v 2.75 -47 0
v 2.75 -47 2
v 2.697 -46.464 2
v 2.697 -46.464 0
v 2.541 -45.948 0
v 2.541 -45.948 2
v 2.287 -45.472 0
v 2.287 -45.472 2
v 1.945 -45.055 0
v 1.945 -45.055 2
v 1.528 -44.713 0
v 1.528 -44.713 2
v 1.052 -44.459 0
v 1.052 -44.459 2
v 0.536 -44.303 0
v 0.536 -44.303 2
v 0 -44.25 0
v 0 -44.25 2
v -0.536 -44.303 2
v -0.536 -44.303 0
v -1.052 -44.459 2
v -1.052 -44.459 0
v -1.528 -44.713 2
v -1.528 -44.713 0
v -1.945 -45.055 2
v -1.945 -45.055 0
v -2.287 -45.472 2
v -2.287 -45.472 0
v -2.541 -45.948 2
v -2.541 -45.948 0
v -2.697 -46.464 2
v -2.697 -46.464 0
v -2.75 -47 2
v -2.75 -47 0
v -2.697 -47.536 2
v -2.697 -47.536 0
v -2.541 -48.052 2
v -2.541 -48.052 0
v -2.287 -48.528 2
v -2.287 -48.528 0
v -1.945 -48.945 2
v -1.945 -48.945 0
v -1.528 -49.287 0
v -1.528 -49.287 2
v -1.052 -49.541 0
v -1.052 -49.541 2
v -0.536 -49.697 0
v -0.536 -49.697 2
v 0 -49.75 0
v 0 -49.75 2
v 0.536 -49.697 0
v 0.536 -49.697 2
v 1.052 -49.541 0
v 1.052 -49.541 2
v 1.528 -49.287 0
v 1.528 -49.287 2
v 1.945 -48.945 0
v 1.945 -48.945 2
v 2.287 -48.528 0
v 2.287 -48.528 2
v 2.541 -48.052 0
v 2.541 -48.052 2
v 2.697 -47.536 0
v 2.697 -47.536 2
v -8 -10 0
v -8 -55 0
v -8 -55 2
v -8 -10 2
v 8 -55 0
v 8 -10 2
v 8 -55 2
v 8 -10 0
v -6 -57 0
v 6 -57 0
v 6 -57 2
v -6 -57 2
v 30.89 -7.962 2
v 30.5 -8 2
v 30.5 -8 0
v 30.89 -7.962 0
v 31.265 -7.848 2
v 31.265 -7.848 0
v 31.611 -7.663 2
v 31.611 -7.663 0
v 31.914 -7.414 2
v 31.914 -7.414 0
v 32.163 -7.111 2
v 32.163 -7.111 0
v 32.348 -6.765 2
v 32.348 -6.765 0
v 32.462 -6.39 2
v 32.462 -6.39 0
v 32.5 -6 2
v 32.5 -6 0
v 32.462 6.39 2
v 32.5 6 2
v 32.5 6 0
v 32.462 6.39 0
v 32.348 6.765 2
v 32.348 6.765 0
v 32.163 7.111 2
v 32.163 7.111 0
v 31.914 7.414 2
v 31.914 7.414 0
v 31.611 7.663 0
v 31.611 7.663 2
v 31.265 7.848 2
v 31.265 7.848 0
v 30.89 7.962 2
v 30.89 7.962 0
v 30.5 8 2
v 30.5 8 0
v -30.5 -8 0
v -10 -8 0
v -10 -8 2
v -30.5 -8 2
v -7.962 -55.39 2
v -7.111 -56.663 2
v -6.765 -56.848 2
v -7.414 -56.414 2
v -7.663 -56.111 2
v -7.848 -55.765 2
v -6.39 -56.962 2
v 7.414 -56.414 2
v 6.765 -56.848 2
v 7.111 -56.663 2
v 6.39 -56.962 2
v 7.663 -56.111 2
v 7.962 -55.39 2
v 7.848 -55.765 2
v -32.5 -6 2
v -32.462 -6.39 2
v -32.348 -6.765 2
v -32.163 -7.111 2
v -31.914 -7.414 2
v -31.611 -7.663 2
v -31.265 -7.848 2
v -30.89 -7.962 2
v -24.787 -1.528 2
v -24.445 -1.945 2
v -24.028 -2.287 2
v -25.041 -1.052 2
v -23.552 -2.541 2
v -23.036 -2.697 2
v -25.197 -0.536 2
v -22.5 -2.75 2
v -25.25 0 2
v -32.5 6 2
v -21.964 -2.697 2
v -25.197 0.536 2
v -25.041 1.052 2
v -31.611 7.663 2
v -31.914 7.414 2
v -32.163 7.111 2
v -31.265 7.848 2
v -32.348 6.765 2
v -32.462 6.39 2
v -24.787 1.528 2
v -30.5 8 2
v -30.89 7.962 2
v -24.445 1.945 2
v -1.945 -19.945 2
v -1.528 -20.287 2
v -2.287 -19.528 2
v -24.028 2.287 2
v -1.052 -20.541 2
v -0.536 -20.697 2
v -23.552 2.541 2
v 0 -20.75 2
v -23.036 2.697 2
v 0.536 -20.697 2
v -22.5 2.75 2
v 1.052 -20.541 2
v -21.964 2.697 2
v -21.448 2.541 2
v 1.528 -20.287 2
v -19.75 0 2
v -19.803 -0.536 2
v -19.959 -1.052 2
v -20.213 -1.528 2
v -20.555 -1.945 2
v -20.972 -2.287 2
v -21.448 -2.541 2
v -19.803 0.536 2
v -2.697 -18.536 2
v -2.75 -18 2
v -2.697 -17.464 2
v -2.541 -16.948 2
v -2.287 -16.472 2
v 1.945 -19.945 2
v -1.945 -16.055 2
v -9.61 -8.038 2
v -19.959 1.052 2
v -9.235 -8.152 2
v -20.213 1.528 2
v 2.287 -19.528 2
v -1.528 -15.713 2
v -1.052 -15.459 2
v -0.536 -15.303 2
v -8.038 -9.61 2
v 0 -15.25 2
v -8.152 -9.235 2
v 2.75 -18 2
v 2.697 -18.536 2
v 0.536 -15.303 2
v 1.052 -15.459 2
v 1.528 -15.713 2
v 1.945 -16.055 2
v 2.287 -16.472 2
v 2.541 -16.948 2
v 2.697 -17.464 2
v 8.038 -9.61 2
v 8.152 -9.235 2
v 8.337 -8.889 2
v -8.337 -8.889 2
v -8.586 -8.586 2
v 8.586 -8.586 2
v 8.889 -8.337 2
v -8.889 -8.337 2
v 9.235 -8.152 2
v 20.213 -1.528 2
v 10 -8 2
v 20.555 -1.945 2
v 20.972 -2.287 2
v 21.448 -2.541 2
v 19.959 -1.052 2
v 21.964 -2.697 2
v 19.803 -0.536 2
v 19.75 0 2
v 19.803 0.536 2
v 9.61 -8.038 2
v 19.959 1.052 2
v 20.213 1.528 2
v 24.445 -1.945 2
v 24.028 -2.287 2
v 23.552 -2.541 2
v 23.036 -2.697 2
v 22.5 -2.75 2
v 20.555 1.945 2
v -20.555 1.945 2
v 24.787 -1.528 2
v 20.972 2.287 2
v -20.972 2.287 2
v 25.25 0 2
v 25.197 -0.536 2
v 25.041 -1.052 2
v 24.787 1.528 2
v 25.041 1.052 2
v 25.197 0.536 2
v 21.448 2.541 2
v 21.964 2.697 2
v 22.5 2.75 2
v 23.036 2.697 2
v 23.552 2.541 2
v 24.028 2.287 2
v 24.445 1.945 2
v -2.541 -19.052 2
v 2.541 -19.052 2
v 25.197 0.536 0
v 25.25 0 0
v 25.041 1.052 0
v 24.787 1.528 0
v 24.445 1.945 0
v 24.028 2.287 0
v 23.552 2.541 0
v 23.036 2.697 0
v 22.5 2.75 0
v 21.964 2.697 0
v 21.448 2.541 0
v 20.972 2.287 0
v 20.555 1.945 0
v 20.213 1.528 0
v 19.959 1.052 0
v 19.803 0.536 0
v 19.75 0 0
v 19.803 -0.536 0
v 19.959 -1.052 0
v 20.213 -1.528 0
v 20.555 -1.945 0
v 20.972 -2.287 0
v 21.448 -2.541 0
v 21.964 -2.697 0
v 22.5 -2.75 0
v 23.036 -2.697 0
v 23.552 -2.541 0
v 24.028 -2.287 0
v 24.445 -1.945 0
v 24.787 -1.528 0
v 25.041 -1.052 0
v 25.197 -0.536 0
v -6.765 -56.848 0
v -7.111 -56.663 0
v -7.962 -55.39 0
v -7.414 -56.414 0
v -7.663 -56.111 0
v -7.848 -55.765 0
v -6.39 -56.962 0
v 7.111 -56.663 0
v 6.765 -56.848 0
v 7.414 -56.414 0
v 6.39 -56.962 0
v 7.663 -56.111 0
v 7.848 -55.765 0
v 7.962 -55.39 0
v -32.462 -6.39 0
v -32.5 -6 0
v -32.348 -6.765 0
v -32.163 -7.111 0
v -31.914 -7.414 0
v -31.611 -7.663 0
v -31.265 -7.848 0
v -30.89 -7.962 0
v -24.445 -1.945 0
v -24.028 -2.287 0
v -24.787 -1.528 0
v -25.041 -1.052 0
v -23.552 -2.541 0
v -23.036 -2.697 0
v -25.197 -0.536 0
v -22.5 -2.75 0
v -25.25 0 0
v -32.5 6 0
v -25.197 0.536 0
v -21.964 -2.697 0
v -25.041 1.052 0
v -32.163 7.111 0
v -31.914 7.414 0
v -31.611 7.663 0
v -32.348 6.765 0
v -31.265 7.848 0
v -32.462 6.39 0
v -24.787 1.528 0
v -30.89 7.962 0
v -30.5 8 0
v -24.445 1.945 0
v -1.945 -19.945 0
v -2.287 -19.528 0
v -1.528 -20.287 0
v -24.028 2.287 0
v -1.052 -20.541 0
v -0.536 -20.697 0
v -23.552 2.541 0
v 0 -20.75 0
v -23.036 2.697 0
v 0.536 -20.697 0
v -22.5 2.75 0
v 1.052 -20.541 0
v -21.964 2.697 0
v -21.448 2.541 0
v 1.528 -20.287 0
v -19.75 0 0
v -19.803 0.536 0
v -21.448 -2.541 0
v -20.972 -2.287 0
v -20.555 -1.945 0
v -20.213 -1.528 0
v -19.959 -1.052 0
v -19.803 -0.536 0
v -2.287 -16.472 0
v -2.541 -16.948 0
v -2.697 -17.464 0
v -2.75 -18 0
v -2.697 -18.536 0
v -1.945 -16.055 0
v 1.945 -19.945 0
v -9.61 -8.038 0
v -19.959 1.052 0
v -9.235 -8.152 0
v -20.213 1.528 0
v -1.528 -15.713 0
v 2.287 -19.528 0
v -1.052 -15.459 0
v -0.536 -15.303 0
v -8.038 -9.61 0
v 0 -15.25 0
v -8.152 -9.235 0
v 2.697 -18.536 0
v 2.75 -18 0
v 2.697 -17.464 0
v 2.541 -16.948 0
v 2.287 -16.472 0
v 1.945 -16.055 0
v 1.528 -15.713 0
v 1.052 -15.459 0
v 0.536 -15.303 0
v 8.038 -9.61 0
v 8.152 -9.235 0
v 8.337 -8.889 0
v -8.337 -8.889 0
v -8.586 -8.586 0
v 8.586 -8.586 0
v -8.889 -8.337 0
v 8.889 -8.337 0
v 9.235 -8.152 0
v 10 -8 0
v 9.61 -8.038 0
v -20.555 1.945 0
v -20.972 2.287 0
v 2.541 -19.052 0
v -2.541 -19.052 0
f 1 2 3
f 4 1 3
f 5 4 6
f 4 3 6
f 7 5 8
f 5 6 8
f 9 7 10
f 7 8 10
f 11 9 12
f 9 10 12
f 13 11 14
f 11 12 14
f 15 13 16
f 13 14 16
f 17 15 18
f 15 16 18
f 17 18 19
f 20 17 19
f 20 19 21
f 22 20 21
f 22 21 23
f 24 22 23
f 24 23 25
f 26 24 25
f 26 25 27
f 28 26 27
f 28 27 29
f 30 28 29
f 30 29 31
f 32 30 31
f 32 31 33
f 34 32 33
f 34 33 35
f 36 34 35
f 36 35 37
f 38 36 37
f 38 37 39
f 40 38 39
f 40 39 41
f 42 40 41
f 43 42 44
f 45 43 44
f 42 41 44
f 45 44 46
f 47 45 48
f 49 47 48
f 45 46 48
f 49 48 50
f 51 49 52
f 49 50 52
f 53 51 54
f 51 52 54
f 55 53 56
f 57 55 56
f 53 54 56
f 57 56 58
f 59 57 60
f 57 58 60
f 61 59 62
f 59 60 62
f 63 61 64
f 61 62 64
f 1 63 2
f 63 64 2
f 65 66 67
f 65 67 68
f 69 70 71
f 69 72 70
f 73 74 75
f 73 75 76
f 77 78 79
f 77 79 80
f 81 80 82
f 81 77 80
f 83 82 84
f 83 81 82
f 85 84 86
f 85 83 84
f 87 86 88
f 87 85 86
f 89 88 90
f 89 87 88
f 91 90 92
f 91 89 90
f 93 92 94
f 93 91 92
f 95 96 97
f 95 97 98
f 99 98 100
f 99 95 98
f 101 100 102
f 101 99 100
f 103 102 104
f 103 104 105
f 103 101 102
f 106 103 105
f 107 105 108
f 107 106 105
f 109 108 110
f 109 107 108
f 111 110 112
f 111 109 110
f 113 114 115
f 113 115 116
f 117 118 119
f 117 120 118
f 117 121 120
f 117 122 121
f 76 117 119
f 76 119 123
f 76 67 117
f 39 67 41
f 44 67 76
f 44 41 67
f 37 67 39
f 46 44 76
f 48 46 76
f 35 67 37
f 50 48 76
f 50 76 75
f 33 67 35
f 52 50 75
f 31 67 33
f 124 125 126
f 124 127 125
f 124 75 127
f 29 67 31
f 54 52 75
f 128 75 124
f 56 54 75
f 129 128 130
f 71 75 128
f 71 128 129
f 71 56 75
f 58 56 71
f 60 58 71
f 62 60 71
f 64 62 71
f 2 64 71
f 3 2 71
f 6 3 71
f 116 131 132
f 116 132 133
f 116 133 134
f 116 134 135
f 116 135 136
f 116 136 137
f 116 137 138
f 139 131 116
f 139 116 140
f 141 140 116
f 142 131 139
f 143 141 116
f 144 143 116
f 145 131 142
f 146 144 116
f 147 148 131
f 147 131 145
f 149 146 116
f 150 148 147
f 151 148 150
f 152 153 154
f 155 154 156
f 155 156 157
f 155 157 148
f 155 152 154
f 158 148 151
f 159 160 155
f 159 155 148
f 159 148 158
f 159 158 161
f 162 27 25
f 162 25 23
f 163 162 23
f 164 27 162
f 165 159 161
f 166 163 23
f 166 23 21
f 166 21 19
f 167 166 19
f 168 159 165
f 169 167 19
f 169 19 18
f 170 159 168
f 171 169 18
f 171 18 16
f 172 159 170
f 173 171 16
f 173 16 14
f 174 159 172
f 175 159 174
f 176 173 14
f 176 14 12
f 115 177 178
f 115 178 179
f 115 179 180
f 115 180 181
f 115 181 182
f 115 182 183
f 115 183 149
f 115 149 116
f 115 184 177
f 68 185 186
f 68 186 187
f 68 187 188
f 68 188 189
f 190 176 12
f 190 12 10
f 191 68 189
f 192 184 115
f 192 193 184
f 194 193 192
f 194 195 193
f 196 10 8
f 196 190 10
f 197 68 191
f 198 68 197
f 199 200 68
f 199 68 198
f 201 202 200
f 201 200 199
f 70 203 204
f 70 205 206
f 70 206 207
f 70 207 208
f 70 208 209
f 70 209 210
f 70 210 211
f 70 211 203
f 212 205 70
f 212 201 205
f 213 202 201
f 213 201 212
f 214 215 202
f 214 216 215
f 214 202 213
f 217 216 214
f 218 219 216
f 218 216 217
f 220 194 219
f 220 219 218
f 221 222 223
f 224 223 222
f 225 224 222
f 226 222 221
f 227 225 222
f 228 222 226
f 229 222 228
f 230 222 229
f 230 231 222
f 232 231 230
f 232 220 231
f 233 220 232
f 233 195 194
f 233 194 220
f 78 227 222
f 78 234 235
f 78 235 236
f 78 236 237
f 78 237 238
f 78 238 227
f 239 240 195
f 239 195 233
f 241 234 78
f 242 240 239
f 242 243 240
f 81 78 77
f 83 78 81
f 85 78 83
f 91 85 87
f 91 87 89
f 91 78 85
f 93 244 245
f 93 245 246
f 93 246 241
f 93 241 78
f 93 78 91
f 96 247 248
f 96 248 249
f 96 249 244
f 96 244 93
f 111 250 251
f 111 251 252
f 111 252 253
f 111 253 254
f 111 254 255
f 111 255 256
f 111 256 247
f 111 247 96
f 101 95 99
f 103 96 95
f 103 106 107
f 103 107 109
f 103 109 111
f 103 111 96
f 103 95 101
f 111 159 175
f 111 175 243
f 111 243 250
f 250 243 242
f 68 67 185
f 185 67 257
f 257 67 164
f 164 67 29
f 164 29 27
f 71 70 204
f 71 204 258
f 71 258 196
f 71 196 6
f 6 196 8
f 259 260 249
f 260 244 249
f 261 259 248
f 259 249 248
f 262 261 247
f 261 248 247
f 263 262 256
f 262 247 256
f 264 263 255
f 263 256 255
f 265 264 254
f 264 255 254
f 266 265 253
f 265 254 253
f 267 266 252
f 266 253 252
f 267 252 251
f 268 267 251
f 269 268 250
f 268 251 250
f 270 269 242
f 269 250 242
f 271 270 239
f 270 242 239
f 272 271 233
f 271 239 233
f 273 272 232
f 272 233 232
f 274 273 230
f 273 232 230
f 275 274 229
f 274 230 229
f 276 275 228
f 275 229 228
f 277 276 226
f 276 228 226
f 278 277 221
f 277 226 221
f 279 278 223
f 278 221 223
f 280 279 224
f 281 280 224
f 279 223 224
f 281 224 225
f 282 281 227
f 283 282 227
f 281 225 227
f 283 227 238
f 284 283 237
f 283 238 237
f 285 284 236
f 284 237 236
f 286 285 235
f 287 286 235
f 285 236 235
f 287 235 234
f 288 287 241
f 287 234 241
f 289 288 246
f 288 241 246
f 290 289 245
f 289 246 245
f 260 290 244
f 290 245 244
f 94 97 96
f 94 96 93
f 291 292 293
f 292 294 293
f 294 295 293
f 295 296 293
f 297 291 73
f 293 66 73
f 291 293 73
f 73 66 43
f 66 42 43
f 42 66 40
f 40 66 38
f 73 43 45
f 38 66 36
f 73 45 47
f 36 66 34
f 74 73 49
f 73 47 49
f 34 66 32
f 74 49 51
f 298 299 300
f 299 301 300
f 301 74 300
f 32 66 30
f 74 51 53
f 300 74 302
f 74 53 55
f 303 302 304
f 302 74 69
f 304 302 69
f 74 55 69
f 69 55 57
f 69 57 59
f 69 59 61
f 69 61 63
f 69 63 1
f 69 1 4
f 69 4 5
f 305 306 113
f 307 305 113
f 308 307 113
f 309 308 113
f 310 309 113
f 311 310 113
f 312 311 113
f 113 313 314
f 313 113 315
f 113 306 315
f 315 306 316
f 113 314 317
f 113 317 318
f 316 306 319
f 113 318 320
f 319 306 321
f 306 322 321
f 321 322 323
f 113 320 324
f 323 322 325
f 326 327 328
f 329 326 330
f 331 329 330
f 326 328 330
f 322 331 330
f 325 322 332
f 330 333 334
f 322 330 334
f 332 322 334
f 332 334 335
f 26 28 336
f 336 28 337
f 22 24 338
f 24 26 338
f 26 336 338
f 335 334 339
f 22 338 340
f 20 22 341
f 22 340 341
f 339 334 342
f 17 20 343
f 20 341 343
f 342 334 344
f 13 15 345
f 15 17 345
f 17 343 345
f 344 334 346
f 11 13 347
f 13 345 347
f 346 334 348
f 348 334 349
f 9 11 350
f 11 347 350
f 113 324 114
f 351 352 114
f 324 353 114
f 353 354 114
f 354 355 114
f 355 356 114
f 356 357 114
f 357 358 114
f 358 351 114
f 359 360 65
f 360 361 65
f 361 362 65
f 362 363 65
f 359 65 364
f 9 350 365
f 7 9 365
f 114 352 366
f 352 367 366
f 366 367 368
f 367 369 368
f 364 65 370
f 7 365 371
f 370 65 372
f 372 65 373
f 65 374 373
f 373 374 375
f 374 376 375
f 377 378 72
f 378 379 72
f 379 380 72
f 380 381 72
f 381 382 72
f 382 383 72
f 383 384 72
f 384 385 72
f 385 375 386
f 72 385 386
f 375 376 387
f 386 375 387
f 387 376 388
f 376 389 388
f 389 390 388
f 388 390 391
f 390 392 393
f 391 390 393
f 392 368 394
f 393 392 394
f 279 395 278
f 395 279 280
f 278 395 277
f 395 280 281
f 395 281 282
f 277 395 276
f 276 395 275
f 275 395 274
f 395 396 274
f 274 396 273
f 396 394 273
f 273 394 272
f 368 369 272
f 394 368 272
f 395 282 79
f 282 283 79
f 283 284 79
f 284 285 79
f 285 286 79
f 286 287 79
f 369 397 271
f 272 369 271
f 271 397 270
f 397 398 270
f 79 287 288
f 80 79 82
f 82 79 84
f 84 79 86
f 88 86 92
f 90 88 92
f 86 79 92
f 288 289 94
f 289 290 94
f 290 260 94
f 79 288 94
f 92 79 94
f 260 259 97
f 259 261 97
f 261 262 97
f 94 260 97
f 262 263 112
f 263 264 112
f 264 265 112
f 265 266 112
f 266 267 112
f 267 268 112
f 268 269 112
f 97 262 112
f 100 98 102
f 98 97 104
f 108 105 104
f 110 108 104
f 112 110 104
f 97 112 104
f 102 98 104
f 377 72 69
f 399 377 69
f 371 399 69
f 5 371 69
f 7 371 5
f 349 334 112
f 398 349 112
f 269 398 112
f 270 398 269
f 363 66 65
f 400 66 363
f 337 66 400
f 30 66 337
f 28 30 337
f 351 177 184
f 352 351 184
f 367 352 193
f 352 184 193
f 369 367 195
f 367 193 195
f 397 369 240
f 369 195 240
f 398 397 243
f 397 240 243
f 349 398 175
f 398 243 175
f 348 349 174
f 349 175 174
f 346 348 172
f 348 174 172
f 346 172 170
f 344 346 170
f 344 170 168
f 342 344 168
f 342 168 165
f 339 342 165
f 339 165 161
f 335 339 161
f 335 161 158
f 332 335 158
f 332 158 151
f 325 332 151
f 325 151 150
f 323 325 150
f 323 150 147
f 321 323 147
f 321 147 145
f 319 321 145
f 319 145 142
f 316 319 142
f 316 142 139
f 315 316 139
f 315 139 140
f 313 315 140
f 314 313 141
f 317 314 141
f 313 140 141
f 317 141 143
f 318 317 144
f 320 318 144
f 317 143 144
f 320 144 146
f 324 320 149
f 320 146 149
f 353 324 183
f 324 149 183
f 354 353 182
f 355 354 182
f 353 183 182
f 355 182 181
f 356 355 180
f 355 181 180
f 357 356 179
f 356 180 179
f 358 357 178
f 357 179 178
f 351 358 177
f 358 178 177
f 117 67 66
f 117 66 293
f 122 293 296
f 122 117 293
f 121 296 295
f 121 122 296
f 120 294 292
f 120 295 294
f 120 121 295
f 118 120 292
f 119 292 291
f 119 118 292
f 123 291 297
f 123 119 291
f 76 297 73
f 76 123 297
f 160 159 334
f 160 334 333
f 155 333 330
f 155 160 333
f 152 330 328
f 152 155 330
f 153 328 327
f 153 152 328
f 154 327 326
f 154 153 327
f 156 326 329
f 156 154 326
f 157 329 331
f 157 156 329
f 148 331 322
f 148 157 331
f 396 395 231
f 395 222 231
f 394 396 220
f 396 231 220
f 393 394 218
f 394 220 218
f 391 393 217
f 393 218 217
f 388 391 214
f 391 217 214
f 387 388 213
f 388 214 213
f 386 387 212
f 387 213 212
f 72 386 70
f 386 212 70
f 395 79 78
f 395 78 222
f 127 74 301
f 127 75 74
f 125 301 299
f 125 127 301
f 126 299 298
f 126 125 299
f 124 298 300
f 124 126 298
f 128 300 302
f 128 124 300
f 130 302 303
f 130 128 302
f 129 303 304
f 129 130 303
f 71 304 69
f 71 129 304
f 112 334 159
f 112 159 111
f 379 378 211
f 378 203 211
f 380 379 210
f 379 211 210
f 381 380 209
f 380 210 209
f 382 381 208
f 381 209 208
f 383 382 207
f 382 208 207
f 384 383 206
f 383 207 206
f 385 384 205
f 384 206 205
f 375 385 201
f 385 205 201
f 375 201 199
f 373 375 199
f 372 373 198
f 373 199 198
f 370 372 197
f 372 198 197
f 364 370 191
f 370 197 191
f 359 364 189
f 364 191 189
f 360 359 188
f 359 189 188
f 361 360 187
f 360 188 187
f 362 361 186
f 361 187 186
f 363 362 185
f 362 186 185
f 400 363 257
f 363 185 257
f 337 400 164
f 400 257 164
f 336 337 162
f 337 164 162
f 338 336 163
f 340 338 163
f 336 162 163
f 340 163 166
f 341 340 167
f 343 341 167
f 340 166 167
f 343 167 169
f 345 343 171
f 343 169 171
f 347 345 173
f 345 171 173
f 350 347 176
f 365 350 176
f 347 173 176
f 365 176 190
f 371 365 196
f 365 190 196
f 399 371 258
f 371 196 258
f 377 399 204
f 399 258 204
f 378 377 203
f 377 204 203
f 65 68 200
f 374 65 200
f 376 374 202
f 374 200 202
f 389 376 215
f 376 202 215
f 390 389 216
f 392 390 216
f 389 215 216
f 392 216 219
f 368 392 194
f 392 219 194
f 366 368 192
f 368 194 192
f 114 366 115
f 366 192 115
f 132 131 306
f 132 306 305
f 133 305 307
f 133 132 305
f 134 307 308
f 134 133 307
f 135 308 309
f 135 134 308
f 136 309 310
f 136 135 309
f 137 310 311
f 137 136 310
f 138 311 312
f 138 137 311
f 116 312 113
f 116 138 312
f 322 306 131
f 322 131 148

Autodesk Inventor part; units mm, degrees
ref_plane "YZ Plane" through (0, 0, 0) normal (1, 0, 0) x (0, 1, 0)
ref_plane "XZ Plane" through (0, 0, 0) normal (0, 1, 0) x (-1, 0, 0)
ref_plane "XY Plane" through (0, 0, 0) normal (0, 0, 1) x (1, 0, 0)
sketch "草图1" plane through (0, 0, 0) normal (0, 0, 1) x (1, 0, 0)
  line L0 (32.5, -8) -> (-32.5, -8)
  line L1 (-32.5, -8) -> (-32.5, 8)
  line L2 (-32.5, 8) -> (32.5, 8)
  line L3 (32.5, 8) -> (32.5, -8)
  line L4 (32.5, -8) -> (-32.5, 8) construction
  line L5 (-32.5, -8) -> (32.5, 8) construction
  line L6 (8, -57) -> (-8, -57)
  line L7 (-8, -57) -> (-8, 8)
  line L8 (-8, 8) -> (8, 8)
  line L9 (8, 8) -> (8, -57)
  line L10 (8, -57) -> (-8, 8) construction
  line L11 (-8, -57) -> (8, 8) construction
  line L12 (0, 0) -> (0, -24.5)
  point P0 (-8, -8)
  point P1 (8, -8)
  dimension "d0" = 65
  dimension "d1" = 16
  dimension "d2" = 49
  dimension "d3" = 16
extrude "拉伸1" add sketch "草图1" along normal blind 2
sketch "草图2" plane through (0, 0, 2) normal (0, 0, 1) x (1, 0, 0)
  line L0 (-32.5, 8) -> (-32.5, -8) projected
  line L1 (-32.5, 0) -> (32.5, 0)
  line L2 (32.5, -8) -> (32.5, 8) projected
  line L3 (0, 8) -> (0, -57)
  line L4 (-8, -57) -> (8, -57) projected
  circle A0 centre (-22.5, 0) radius 2.75
  circle A1 centre (0, -18) radius 2.75
  circle A2 centre (0, -47) radius 2.75
  circle A3 centre (22.5, 0) radius 2.75
  point P0 (0, 0)
  dimension "d6" = 22.5
  dimension "d7" = 5.5
  dimension "d8" = 5.5
  dimension "d9" = 5.5
  dimension "d10" = 29
  dimension "d11" = 10
extrude "拉伸2" cut sketch "草图2" against normal blind 10
fillet "圆角1" radius 2 8 edges at (-8, -8, 1) (-32.5, -8, 1) (-32.5, 8, 1) (32.5, -8, 1) (-8, -57, 1) (8, -57, 1) (8, -8, 1) (32.5, 8, 1)
equation "\"d12\" = d11"
properties part number "T型"
